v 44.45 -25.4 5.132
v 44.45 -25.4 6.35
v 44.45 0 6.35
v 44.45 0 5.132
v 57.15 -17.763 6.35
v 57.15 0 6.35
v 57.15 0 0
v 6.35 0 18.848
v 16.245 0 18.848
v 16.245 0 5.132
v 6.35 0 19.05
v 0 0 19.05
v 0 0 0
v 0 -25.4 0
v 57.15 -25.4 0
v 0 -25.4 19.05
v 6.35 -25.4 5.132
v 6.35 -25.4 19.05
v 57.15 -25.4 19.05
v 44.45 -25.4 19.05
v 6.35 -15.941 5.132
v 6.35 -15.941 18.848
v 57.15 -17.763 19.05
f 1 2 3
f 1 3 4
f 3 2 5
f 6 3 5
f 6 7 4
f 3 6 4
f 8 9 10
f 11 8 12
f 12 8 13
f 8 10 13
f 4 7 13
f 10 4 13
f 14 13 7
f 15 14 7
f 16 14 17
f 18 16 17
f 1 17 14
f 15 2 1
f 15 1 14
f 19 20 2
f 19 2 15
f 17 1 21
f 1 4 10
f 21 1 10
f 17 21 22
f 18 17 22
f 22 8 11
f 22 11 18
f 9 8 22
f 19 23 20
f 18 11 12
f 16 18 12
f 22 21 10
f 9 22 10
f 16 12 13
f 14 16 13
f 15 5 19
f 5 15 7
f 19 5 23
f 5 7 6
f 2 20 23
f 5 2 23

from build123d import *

# Parameters (mm, degrees)
F1_DEPTH = 25.4
F3_DEPTH = 12.7
F5_DEPTH = 13.716


with BuildPart() as f1:
    # F0 (on Front) → F1 (new body)
    with BuildSketch(Plane.XZ):
        Polygon((0, 19.05), (0, 0), (57.15, 0), (57.15, 19.05), (44.45, 19.05), (44.45, 5.132193), (6.35, 5.132193), (6.35, 19.05), align=None)
    extrude(amount=F1_DEPTH)

    # F2 (on face) → F3 (cut)
    with BuildSketch(Plane.XY.offset(19.05)):
        Polygon((44.45, 0), (44.45, -25.4), (57.15, -17.763132), (57.15, 0), align=None)
    extrude(amount=-F3_DEPTH, mode=Mode.SUBTRACT)

    # F4 (on face) → F5 (join)
    with BuildSketch(Plane.XY.offset(5.132193)):
        Polygon((6.35, 0), (6.35, -15.941272), (16.244914, 0), align=None)
    extrude(amount=F5_DEPTH)


solid = f1.part
